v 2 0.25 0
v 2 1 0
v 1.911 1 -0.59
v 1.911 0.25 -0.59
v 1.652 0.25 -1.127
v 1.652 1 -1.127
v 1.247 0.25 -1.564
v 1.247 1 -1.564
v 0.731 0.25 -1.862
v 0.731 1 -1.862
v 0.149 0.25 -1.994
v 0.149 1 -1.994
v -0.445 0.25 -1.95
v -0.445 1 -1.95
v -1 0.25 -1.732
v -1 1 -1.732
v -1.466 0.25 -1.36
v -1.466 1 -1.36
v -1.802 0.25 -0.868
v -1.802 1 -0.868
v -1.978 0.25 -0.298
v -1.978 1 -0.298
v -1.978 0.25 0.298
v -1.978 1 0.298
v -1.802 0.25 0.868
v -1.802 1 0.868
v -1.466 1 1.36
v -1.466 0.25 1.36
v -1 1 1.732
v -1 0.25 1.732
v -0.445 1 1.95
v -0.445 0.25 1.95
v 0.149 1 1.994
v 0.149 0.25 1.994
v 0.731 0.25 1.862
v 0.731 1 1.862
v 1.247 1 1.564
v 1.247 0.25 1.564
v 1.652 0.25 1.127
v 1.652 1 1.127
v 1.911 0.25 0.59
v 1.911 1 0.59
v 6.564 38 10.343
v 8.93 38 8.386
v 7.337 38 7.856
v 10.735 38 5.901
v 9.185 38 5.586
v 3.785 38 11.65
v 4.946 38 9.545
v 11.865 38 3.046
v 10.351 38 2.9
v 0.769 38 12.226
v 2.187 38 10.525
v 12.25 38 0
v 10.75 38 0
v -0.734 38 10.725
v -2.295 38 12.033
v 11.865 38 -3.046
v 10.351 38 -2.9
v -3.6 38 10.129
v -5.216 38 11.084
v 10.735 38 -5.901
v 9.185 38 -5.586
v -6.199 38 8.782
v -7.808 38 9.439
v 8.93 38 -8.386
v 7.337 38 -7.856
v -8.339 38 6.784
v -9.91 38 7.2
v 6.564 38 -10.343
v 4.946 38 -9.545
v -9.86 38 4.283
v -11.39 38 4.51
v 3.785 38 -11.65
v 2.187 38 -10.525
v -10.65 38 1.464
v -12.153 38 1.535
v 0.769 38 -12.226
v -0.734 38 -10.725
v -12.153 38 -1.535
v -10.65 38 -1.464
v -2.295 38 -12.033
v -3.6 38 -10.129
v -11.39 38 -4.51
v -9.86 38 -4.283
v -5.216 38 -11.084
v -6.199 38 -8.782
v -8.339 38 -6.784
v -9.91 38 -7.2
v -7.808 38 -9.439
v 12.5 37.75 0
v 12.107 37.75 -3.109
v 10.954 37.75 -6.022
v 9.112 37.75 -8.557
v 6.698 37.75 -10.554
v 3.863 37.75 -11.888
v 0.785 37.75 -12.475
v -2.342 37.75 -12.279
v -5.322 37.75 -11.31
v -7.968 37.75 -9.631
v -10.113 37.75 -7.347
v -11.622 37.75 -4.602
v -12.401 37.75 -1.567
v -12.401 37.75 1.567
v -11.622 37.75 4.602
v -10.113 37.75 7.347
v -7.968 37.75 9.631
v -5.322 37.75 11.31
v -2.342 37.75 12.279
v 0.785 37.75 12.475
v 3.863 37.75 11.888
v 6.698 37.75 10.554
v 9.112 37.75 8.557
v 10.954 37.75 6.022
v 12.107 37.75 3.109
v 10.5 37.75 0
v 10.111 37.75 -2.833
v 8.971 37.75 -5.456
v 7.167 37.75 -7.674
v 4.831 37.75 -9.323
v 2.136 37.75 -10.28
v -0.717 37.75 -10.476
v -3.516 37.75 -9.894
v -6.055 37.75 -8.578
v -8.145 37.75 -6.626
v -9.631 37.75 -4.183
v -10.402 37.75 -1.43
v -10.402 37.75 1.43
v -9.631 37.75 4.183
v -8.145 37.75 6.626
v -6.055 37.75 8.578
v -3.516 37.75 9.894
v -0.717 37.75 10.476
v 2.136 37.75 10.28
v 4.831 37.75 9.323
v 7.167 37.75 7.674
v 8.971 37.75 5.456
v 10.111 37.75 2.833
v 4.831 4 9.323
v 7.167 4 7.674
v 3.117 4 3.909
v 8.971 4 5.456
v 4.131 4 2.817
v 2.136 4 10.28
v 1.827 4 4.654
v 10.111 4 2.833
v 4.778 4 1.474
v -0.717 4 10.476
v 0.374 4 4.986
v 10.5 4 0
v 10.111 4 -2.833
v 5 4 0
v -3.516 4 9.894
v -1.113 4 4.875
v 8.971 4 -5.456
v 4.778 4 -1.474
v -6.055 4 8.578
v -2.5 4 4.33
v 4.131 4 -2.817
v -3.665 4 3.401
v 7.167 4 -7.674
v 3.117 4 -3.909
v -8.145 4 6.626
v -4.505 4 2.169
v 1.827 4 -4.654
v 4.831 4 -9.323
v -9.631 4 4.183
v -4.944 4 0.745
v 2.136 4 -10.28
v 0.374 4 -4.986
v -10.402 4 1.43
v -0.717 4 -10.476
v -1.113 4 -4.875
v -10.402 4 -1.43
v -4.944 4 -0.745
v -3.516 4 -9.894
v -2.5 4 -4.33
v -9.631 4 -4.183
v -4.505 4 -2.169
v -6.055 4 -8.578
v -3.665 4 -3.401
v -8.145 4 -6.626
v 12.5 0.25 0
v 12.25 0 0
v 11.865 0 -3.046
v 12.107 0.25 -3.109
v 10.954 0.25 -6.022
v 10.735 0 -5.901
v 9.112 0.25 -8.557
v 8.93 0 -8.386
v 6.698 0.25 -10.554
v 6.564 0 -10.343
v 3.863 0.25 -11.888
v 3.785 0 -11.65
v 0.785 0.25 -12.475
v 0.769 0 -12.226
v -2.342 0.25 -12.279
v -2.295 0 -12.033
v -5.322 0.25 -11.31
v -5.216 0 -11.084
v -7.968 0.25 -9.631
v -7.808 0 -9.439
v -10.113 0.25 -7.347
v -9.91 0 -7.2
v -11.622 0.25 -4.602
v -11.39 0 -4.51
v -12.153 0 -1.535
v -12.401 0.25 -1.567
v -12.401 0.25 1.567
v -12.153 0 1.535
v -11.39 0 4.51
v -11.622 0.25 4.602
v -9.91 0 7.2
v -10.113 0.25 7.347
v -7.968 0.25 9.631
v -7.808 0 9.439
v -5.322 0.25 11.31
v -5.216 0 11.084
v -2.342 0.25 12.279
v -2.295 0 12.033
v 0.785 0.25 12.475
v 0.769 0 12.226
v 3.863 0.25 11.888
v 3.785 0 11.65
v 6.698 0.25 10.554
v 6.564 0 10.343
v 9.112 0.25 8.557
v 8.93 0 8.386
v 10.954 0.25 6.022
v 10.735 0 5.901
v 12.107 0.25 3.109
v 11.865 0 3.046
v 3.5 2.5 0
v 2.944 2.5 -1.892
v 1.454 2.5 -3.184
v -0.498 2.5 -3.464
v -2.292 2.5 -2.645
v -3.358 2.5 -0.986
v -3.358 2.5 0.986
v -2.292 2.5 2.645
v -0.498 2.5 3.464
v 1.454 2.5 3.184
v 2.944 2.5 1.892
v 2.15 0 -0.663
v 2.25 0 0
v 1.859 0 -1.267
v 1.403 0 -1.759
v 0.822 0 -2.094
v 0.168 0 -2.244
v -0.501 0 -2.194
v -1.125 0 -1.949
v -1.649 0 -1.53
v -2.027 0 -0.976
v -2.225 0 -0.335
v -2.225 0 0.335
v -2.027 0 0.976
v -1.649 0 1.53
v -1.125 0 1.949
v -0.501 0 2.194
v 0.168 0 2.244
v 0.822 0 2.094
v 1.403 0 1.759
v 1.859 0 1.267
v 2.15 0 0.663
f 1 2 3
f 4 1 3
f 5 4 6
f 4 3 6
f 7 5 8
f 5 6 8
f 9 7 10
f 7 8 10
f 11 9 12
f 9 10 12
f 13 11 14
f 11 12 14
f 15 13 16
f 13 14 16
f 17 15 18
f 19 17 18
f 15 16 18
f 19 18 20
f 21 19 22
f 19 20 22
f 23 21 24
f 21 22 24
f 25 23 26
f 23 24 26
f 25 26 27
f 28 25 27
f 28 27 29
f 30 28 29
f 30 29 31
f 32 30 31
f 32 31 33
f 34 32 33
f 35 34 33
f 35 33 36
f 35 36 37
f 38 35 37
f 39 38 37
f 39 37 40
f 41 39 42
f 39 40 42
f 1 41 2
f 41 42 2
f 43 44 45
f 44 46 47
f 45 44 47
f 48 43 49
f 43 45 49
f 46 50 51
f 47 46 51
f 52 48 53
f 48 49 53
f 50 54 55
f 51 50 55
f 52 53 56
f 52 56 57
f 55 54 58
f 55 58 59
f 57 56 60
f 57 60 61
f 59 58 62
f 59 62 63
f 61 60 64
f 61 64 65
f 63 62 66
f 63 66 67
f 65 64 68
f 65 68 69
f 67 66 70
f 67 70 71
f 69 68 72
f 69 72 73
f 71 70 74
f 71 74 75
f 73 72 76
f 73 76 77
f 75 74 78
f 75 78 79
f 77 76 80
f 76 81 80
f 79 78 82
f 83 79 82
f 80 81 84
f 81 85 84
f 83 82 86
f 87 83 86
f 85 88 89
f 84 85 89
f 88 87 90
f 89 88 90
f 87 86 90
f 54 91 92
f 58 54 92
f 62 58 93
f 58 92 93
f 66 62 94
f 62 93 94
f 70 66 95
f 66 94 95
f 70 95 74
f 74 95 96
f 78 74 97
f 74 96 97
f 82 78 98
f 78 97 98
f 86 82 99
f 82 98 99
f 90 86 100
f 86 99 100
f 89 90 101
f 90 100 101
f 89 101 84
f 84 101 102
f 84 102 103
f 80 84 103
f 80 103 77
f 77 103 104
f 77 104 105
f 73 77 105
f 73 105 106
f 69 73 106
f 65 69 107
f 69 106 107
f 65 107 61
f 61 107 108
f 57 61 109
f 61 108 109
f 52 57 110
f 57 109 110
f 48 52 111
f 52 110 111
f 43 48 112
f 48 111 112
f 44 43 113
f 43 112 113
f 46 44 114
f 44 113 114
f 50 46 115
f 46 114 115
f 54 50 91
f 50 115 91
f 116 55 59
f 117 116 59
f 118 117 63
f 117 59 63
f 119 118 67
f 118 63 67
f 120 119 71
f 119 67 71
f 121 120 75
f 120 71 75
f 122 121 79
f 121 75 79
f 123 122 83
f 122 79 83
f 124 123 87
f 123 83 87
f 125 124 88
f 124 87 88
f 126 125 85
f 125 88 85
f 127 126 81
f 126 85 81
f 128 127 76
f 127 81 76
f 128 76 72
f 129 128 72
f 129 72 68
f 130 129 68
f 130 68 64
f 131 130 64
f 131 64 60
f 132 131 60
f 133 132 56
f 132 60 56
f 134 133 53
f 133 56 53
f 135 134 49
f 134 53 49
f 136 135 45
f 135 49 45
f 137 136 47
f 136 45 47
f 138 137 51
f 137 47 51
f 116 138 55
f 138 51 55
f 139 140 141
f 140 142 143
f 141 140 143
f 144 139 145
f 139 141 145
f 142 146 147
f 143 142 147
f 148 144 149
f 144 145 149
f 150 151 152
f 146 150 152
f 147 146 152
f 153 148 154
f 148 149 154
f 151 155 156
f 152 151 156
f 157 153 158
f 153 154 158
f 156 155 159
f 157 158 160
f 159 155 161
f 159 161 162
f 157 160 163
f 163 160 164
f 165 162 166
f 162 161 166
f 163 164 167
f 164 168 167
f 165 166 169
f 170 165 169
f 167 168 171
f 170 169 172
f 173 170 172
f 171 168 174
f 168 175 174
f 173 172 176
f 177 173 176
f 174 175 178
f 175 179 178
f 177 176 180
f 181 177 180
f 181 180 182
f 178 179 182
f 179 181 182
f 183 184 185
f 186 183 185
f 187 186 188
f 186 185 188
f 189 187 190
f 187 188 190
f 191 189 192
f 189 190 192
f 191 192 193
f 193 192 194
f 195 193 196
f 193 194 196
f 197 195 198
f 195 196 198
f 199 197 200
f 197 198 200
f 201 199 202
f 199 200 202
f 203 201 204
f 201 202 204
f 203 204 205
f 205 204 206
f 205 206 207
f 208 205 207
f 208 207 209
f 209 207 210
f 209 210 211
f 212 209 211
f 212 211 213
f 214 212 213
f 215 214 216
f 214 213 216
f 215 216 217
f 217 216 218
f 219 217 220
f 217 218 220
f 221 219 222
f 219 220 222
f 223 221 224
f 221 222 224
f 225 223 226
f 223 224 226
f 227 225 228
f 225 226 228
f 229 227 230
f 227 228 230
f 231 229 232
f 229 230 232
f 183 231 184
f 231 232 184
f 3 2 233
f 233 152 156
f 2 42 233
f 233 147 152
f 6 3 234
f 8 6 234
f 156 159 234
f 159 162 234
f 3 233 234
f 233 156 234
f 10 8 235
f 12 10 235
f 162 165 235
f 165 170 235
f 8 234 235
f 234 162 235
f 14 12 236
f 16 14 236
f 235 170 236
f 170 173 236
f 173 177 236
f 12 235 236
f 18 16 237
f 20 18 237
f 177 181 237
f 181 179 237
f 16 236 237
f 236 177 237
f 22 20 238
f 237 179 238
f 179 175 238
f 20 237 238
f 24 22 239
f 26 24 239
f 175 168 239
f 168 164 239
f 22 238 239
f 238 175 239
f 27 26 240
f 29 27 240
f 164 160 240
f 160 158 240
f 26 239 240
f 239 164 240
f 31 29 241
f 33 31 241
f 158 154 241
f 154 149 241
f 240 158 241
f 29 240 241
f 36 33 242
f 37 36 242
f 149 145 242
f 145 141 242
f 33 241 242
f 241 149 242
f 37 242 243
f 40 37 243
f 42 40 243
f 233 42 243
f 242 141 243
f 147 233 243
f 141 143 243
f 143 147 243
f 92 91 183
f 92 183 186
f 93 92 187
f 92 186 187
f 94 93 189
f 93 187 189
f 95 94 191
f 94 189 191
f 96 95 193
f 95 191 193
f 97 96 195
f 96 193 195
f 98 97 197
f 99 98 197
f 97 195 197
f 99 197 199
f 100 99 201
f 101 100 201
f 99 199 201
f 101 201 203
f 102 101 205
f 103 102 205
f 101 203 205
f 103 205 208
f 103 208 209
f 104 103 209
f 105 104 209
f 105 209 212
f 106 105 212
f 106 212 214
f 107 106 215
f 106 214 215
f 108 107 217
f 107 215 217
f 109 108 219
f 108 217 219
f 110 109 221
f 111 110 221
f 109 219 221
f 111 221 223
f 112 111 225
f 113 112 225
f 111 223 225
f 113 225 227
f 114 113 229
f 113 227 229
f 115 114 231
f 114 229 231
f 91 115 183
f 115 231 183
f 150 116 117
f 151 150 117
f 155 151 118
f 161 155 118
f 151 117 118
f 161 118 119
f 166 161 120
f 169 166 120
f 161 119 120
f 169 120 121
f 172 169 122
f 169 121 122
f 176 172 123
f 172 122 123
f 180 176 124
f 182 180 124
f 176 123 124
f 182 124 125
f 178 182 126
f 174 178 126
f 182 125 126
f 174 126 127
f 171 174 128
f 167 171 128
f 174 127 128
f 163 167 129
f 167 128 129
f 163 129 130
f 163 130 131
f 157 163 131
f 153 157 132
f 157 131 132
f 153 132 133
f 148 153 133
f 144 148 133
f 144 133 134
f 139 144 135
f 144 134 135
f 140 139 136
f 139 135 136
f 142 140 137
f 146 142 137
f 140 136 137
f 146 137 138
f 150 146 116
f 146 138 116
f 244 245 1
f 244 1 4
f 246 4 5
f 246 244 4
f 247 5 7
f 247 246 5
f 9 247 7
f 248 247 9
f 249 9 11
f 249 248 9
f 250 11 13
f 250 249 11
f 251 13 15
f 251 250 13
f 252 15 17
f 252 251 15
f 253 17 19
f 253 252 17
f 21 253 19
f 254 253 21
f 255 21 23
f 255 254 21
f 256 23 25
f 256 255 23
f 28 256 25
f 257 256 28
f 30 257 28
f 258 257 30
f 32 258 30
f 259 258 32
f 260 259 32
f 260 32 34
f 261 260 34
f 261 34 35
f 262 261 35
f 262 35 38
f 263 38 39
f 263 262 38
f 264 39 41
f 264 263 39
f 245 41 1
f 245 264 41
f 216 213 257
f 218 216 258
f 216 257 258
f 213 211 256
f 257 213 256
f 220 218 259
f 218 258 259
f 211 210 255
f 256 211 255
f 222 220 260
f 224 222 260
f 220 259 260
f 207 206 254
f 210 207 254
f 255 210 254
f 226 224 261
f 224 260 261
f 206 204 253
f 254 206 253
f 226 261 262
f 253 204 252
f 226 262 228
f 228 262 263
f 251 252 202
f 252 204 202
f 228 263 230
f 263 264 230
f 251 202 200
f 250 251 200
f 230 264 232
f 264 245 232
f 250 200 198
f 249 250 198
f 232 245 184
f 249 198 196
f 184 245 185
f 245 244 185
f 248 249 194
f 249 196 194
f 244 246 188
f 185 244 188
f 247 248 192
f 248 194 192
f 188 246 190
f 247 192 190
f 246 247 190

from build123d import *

# Parameters (mm, degrees)
CHAMFER1_SIZE = 0.25


with BuildPart() as part:
    # Sketch1 → Revolve1 (revolve)
    with BuildSketch(Plane.XY):
        Polygon((2, 0), (2, 1), (5, 4), (10.5, 4), (10.5, 38), (12.5, 38), (12.5, 0), align=None)
    revolve(axis=Axis((0, -587.15114798, 0), (0, 1, 0)))

    # Chamfer1
    chamfer1_edges = [part.edges().sort_by_distance(p)[0] for p in [
        (-12.5, 0, 0),
        (-12.5, 38, 0),
        (-10.5, 38, 0),
        (-2, 0, 0),
    ]]
    chamfer(chamfer1_edges, length=CHAMFER1_SIZE)


solid = part.part
